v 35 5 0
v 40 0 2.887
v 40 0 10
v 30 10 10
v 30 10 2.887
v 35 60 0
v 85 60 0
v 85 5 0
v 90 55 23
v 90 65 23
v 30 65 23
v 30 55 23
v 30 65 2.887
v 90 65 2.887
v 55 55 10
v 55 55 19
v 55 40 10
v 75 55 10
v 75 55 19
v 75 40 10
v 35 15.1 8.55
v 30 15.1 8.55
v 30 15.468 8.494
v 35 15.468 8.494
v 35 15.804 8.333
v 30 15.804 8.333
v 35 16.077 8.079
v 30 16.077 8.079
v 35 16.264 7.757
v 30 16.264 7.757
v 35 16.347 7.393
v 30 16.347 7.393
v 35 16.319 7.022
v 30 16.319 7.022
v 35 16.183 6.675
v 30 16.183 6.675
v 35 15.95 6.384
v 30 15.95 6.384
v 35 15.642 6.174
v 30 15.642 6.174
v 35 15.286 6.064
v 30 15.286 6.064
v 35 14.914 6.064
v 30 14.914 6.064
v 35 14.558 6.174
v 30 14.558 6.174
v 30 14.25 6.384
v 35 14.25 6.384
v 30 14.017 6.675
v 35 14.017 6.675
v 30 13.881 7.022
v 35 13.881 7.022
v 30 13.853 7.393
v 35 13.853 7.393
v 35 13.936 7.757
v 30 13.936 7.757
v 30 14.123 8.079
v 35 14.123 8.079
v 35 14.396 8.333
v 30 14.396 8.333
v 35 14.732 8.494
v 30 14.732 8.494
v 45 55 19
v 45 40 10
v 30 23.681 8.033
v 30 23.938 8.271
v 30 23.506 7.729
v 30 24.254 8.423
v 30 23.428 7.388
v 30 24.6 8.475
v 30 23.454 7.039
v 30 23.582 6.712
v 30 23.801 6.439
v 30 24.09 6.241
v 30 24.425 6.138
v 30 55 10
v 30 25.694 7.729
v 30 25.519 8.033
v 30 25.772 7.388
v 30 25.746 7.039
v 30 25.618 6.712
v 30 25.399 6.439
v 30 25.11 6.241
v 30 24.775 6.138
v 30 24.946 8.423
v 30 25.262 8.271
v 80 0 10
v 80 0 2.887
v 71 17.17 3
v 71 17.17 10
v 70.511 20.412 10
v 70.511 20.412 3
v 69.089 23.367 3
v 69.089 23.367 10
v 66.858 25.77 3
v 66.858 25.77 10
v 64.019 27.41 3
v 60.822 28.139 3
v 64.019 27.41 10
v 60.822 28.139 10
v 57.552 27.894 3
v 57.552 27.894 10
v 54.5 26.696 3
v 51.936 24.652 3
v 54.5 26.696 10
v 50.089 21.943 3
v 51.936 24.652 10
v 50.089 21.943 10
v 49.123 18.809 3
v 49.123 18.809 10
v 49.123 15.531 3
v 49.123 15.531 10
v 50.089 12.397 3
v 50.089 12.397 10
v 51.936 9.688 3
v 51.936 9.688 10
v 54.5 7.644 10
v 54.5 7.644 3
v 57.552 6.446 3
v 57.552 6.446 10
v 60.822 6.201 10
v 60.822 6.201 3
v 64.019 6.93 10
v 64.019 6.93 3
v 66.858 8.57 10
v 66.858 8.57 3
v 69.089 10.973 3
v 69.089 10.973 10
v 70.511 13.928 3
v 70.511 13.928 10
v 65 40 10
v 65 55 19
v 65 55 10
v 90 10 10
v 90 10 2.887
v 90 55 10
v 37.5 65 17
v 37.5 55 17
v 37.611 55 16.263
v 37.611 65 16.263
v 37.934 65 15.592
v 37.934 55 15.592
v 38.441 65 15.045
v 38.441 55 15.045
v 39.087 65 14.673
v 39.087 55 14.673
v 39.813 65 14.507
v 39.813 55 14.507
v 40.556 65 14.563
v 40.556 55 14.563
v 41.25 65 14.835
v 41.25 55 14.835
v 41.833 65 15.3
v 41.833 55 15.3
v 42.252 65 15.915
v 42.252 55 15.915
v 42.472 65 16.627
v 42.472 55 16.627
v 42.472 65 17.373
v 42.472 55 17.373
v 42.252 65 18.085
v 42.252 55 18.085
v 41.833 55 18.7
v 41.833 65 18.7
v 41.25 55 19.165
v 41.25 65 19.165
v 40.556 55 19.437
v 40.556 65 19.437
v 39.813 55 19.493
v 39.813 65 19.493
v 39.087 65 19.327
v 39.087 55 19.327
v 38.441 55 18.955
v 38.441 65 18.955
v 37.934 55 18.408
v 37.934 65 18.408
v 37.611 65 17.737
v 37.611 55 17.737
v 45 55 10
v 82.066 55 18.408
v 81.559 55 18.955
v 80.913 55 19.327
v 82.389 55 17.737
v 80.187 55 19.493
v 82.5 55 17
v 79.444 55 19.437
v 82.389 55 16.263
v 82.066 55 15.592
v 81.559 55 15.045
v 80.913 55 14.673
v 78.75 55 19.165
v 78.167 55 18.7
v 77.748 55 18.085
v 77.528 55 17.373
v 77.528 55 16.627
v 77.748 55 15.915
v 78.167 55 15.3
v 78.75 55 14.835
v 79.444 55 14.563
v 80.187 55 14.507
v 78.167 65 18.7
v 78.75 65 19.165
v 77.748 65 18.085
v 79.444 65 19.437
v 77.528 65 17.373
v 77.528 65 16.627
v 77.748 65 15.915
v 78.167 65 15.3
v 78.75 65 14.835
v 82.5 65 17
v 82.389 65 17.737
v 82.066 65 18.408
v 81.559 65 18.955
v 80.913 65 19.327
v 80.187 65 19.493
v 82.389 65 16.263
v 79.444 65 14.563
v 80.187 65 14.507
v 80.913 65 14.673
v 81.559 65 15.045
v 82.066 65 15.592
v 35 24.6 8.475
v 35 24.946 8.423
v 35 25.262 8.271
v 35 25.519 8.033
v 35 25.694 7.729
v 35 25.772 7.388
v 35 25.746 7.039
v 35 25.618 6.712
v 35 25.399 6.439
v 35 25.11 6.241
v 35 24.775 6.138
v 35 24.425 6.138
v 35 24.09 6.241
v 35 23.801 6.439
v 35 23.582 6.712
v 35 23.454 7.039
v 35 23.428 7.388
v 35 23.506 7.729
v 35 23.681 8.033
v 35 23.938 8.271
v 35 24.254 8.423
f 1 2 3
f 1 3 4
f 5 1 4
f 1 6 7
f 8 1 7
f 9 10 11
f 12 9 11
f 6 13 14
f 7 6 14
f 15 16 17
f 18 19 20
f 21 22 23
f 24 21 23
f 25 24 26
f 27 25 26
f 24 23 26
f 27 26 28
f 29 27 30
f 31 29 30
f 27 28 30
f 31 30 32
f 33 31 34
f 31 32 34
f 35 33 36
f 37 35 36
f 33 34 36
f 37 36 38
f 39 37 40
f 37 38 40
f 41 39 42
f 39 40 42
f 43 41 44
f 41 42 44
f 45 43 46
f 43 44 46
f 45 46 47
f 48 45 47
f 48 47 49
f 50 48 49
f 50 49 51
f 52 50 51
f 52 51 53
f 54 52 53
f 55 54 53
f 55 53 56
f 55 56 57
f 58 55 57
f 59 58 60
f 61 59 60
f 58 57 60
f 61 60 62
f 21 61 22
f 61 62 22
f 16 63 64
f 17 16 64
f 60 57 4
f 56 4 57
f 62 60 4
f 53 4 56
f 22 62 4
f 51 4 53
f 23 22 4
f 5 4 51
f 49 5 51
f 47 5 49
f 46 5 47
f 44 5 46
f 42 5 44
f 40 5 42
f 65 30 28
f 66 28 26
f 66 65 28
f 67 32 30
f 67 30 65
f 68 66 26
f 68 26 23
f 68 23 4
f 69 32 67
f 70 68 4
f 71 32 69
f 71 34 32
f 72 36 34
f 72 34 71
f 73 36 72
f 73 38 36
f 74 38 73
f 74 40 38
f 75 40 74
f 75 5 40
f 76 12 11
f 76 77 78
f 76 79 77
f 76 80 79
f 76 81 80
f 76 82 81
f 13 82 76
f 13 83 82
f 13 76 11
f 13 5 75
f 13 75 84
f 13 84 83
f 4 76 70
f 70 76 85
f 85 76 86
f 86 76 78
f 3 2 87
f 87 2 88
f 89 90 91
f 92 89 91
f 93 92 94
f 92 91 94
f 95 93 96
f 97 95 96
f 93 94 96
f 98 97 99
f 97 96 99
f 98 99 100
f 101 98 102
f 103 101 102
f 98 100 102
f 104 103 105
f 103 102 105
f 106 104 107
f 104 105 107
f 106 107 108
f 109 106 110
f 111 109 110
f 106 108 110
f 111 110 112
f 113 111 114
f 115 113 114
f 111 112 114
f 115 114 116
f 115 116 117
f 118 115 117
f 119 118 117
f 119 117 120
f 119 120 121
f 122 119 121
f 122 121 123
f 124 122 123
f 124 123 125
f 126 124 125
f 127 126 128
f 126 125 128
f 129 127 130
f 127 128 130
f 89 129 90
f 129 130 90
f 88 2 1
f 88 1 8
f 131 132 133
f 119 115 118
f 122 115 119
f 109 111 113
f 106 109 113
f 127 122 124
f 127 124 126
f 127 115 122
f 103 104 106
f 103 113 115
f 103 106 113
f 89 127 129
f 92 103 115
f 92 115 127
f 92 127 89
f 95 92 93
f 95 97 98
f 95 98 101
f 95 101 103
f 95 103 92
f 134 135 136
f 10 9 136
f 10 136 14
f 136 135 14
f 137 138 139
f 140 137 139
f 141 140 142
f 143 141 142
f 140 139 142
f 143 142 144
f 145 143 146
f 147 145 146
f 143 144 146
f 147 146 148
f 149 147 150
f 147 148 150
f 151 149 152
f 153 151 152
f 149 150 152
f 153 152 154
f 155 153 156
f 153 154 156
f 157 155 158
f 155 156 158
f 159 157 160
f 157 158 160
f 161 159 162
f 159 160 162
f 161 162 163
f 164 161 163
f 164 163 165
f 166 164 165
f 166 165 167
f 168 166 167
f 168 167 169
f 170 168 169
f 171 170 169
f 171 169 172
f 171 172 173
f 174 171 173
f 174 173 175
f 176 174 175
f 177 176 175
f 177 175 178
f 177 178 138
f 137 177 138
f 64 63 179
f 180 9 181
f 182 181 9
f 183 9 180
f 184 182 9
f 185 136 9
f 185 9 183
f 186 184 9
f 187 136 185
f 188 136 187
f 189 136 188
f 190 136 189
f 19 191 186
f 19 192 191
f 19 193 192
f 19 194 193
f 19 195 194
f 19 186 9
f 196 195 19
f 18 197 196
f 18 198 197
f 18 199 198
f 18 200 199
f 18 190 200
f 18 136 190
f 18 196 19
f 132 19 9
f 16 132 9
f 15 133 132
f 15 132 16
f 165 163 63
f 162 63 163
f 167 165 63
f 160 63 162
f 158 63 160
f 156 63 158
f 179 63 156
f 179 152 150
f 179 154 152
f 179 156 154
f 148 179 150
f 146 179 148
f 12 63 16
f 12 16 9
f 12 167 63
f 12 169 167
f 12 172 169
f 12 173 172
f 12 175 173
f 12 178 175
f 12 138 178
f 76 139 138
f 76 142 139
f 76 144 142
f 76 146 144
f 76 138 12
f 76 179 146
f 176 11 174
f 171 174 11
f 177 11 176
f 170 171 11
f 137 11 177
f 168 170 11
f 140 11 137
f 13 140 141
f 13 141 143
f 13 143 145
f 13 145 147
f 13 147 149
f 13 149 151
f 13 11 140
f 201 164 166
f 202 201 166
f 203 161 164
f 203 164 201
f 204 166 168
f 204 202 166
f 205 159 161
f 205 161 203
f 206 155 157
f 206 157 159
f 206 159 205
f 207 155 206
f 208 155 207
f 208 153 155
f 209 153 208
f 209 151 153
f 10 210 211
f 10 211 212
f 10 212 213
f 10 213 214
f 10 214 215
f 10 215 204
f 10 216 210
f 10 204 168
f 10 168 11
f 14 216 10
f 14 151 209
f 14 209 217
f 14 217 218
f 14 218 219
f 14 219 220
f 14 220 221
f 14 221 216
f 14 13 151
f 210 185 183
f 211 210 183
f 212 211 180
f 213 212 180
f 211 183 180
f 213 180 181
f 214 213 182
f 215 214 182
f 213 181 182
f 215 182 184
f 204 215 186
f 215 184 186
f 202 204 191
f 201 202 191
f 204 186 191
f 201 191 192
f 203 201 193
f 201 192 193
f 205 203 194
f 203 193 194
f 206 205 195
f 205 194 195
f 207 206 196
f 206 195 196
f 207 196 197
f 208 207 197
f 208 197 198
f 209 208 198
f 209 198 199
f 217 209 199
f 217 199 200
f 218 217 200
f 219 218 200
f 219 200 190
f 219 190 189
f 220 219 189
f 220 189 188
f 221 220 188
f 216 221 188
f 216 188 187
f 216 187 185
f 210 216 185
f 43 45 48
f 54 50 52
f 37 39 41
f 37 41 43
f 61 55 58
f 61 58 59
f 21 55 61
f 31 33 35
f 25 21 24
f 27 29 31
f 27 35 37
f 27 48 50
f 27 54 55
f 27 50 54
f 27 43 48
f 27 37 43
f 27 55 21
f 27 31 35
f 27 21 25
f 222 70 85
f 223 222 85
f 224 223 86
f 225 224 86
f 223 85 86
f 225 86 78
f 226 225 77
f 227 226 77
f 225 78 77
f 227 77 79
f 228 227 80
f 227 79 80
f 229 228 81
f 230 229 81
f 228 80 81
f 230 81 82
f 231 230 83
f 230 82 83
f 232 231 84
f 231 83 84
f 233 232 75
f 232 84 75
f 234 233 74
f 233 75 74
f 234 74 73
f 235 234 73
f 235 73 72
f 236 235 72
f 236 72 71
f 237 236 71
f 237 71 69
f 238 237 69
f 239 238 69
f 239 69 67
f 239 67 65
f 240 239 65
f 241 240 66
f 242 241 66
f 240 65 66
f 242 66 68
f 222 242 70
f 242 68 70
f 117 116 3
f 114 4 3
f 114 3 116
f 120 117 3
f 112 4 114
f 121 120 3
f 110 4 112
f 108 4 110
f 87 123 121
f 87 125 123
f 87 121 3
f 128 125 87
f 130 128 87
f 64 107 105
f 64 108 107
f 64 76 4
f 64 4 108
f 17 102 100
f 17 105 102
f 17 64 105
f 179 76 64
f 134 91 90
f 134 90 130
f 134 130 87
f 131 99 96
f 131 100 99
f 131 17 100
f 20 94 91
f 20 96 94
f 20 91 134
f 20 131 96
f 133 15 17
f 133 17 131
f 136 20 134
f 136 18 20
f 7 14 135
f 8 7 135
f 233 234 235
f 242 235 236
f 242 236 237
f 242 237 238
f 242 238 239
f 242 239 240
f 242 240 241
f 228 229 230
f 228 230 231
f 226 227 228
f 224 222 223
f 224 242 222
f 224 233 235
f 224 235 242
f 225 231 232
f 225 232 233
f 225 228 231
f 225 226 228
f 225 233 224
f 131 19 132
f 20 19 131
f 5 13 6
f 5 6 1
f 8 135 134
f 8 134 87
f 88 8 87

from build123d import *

# Parameters (mm, degrees)
SKETCH1_W           = 60
SKETCH1_H           = 65
BOSS_EXTRUDE1_DEPTH = 10
SKETCH6_W           = 60
SKETCH6_H           = 10
BOSS_EXTRUDE2_DEPTH = 23
CHAMFER1_SIZE       = 5
CHAMFER1_SIZE2      = 2.886751346
SKETCH5_R           = 11
CUT_EXTRUDE4_DEPTH  = 7
SKETCH12_R          = 2.5
CUT_EXTRUDE6_DEPTH  = 108.953693777
RIB1_REACH          = 81.712
SKETCH13_WALL_W     = 178.916818752
SKETCH13_WALL_H     = 10
CHAMFER3_START      = -1
CHAMFER3_DEPTH      = 24
SKETCH14_R          = 1.175
SKETCH14_R_2        = 1.25
CUT_EXTRUDE7_DEPTH  = 5


with BuildPart() as part:
    # Sketch1 → Boss-Extrude1 (new body)
    with BuildSketch(Plane.XY):
        with Locations((60, 32.5)):
            Rectangle(SKETCH1_W, SKETCH1_H)
    extrude(amount=BOSS_EXTRUDE1_DEPTH)

    # Sketch6 → Boss-Extrude2 (add)
    with BuildSketch(Plane(origin=(0, 0, 0), x_dir=(-1, 0, 0), z_dir=(0, 0, -1))):
        with Locations((-60, 60)):
            Rectangle(SKETCH6_W, SKETCH6_H)
    extrude(amount=-BOSS_EXTRUDE2_DEPTH)

    # Chamfer1
    chamfer1_edges = [part.edges().sort_by_distance(p)[0] for p in [
        (60, 65, 0),
        (90, 32.5, 0),
        (60, 0, 0),
        (30, 32.5, 0),
    ]]
    chamfer1_side = [part.faces().sort_by_distance(p)[0] for p in [
        (60, 32.5, 0),
    ]]
    chamfer(chamfer1_edges, length=CHAMFER1_SIZE, length2=CHAMFER1_SIZE2, reference=chamfer1_side[0])

    # Sketch5 → Cut-Extrude4 (cut)
    with BuildSketch(Plane.XY.offset(10)):
        with Locations((60, 17.17)):
            Circle(SKETCH5_R)
    extrude(amount=-CUT_EXTRUDE4_DEPTH, mode=Mode.SUBTRACT)

    # Sketch12 → Cut-Extrude6 (cut, through all)
    with BuildSketch(Plane(origin=(0, 55, 0), x_dir=(-1, 0, 0), z_dir=(0, -1, 0))):
        with Locations(Location((-80, -17, 0), (0, 0, 180))):
            Circle(SKETCH12_R)
        with Locations((-40, -17)):
            Circle(SKETCH12_R)
    extrude(amount=-CUT_EXTRUDE6_DEPTH, mode=Mode.SUBTRACT)

    # Sketch13 wall → Rib1 (add, up to next)
    with BuildSketch(Plane(origin=(50, 47.5, 14.5), x_dir=(0, -0.857492925713, -0.514495755428), z_dir=(0, 0.514495755428, -0.857492925713)), mode=Mode.PRIVATE) as rib1_sk1:
        Rectangle(SKETCH13_WALL_W, SKETCH13_WALL_H)
    rib1_tool1 = extrude(rib1_sk1.sketch, amount=RIB1_REACH, mode=Mode.PRIVATE) - part.part
    rib1 = rib1_tool1.solids().sort_by_distance((50, 47.5, 14.5))[0]
    add(rib1)

    # Mirror1: Rib1 across plane
    add(rib1.mirror(Plane(origin=(60, 0, 0), x_dir=(0, 0, 1), z_dir=(1, 0, 0))))

    # Chamfer3: read off the stored shape, not the designer's step
    # Chamfer3 outline → Chamfer3 (cut)
    with BuildSketch(Plane.XY.offset(CHAMFER3_START)):
        Polygon((90, 0), (90, 10), (80, 0), align=None)
        Polygon((30, 0), (40, 0), (30, 10), align=None)
    extrude(amount=CHAMFER3_DEPTH, mode=Mode.SUBTRACT)

    # Sketch14 → Cut-Extrude7 (cut)
    with BuildSketch(Plane.ZY.offset(-30)):
        with Locations((7.3, 24.6)):
            Circle(SKETCH14_R)
        with Locations((7.3, 15.1)):
            Circle(SKETCH14_R_2)
    extrude(amount=-CUT_EXTRUDE7_DEPTH, mode=Mode.SUBTRACT)


solid = part.part
